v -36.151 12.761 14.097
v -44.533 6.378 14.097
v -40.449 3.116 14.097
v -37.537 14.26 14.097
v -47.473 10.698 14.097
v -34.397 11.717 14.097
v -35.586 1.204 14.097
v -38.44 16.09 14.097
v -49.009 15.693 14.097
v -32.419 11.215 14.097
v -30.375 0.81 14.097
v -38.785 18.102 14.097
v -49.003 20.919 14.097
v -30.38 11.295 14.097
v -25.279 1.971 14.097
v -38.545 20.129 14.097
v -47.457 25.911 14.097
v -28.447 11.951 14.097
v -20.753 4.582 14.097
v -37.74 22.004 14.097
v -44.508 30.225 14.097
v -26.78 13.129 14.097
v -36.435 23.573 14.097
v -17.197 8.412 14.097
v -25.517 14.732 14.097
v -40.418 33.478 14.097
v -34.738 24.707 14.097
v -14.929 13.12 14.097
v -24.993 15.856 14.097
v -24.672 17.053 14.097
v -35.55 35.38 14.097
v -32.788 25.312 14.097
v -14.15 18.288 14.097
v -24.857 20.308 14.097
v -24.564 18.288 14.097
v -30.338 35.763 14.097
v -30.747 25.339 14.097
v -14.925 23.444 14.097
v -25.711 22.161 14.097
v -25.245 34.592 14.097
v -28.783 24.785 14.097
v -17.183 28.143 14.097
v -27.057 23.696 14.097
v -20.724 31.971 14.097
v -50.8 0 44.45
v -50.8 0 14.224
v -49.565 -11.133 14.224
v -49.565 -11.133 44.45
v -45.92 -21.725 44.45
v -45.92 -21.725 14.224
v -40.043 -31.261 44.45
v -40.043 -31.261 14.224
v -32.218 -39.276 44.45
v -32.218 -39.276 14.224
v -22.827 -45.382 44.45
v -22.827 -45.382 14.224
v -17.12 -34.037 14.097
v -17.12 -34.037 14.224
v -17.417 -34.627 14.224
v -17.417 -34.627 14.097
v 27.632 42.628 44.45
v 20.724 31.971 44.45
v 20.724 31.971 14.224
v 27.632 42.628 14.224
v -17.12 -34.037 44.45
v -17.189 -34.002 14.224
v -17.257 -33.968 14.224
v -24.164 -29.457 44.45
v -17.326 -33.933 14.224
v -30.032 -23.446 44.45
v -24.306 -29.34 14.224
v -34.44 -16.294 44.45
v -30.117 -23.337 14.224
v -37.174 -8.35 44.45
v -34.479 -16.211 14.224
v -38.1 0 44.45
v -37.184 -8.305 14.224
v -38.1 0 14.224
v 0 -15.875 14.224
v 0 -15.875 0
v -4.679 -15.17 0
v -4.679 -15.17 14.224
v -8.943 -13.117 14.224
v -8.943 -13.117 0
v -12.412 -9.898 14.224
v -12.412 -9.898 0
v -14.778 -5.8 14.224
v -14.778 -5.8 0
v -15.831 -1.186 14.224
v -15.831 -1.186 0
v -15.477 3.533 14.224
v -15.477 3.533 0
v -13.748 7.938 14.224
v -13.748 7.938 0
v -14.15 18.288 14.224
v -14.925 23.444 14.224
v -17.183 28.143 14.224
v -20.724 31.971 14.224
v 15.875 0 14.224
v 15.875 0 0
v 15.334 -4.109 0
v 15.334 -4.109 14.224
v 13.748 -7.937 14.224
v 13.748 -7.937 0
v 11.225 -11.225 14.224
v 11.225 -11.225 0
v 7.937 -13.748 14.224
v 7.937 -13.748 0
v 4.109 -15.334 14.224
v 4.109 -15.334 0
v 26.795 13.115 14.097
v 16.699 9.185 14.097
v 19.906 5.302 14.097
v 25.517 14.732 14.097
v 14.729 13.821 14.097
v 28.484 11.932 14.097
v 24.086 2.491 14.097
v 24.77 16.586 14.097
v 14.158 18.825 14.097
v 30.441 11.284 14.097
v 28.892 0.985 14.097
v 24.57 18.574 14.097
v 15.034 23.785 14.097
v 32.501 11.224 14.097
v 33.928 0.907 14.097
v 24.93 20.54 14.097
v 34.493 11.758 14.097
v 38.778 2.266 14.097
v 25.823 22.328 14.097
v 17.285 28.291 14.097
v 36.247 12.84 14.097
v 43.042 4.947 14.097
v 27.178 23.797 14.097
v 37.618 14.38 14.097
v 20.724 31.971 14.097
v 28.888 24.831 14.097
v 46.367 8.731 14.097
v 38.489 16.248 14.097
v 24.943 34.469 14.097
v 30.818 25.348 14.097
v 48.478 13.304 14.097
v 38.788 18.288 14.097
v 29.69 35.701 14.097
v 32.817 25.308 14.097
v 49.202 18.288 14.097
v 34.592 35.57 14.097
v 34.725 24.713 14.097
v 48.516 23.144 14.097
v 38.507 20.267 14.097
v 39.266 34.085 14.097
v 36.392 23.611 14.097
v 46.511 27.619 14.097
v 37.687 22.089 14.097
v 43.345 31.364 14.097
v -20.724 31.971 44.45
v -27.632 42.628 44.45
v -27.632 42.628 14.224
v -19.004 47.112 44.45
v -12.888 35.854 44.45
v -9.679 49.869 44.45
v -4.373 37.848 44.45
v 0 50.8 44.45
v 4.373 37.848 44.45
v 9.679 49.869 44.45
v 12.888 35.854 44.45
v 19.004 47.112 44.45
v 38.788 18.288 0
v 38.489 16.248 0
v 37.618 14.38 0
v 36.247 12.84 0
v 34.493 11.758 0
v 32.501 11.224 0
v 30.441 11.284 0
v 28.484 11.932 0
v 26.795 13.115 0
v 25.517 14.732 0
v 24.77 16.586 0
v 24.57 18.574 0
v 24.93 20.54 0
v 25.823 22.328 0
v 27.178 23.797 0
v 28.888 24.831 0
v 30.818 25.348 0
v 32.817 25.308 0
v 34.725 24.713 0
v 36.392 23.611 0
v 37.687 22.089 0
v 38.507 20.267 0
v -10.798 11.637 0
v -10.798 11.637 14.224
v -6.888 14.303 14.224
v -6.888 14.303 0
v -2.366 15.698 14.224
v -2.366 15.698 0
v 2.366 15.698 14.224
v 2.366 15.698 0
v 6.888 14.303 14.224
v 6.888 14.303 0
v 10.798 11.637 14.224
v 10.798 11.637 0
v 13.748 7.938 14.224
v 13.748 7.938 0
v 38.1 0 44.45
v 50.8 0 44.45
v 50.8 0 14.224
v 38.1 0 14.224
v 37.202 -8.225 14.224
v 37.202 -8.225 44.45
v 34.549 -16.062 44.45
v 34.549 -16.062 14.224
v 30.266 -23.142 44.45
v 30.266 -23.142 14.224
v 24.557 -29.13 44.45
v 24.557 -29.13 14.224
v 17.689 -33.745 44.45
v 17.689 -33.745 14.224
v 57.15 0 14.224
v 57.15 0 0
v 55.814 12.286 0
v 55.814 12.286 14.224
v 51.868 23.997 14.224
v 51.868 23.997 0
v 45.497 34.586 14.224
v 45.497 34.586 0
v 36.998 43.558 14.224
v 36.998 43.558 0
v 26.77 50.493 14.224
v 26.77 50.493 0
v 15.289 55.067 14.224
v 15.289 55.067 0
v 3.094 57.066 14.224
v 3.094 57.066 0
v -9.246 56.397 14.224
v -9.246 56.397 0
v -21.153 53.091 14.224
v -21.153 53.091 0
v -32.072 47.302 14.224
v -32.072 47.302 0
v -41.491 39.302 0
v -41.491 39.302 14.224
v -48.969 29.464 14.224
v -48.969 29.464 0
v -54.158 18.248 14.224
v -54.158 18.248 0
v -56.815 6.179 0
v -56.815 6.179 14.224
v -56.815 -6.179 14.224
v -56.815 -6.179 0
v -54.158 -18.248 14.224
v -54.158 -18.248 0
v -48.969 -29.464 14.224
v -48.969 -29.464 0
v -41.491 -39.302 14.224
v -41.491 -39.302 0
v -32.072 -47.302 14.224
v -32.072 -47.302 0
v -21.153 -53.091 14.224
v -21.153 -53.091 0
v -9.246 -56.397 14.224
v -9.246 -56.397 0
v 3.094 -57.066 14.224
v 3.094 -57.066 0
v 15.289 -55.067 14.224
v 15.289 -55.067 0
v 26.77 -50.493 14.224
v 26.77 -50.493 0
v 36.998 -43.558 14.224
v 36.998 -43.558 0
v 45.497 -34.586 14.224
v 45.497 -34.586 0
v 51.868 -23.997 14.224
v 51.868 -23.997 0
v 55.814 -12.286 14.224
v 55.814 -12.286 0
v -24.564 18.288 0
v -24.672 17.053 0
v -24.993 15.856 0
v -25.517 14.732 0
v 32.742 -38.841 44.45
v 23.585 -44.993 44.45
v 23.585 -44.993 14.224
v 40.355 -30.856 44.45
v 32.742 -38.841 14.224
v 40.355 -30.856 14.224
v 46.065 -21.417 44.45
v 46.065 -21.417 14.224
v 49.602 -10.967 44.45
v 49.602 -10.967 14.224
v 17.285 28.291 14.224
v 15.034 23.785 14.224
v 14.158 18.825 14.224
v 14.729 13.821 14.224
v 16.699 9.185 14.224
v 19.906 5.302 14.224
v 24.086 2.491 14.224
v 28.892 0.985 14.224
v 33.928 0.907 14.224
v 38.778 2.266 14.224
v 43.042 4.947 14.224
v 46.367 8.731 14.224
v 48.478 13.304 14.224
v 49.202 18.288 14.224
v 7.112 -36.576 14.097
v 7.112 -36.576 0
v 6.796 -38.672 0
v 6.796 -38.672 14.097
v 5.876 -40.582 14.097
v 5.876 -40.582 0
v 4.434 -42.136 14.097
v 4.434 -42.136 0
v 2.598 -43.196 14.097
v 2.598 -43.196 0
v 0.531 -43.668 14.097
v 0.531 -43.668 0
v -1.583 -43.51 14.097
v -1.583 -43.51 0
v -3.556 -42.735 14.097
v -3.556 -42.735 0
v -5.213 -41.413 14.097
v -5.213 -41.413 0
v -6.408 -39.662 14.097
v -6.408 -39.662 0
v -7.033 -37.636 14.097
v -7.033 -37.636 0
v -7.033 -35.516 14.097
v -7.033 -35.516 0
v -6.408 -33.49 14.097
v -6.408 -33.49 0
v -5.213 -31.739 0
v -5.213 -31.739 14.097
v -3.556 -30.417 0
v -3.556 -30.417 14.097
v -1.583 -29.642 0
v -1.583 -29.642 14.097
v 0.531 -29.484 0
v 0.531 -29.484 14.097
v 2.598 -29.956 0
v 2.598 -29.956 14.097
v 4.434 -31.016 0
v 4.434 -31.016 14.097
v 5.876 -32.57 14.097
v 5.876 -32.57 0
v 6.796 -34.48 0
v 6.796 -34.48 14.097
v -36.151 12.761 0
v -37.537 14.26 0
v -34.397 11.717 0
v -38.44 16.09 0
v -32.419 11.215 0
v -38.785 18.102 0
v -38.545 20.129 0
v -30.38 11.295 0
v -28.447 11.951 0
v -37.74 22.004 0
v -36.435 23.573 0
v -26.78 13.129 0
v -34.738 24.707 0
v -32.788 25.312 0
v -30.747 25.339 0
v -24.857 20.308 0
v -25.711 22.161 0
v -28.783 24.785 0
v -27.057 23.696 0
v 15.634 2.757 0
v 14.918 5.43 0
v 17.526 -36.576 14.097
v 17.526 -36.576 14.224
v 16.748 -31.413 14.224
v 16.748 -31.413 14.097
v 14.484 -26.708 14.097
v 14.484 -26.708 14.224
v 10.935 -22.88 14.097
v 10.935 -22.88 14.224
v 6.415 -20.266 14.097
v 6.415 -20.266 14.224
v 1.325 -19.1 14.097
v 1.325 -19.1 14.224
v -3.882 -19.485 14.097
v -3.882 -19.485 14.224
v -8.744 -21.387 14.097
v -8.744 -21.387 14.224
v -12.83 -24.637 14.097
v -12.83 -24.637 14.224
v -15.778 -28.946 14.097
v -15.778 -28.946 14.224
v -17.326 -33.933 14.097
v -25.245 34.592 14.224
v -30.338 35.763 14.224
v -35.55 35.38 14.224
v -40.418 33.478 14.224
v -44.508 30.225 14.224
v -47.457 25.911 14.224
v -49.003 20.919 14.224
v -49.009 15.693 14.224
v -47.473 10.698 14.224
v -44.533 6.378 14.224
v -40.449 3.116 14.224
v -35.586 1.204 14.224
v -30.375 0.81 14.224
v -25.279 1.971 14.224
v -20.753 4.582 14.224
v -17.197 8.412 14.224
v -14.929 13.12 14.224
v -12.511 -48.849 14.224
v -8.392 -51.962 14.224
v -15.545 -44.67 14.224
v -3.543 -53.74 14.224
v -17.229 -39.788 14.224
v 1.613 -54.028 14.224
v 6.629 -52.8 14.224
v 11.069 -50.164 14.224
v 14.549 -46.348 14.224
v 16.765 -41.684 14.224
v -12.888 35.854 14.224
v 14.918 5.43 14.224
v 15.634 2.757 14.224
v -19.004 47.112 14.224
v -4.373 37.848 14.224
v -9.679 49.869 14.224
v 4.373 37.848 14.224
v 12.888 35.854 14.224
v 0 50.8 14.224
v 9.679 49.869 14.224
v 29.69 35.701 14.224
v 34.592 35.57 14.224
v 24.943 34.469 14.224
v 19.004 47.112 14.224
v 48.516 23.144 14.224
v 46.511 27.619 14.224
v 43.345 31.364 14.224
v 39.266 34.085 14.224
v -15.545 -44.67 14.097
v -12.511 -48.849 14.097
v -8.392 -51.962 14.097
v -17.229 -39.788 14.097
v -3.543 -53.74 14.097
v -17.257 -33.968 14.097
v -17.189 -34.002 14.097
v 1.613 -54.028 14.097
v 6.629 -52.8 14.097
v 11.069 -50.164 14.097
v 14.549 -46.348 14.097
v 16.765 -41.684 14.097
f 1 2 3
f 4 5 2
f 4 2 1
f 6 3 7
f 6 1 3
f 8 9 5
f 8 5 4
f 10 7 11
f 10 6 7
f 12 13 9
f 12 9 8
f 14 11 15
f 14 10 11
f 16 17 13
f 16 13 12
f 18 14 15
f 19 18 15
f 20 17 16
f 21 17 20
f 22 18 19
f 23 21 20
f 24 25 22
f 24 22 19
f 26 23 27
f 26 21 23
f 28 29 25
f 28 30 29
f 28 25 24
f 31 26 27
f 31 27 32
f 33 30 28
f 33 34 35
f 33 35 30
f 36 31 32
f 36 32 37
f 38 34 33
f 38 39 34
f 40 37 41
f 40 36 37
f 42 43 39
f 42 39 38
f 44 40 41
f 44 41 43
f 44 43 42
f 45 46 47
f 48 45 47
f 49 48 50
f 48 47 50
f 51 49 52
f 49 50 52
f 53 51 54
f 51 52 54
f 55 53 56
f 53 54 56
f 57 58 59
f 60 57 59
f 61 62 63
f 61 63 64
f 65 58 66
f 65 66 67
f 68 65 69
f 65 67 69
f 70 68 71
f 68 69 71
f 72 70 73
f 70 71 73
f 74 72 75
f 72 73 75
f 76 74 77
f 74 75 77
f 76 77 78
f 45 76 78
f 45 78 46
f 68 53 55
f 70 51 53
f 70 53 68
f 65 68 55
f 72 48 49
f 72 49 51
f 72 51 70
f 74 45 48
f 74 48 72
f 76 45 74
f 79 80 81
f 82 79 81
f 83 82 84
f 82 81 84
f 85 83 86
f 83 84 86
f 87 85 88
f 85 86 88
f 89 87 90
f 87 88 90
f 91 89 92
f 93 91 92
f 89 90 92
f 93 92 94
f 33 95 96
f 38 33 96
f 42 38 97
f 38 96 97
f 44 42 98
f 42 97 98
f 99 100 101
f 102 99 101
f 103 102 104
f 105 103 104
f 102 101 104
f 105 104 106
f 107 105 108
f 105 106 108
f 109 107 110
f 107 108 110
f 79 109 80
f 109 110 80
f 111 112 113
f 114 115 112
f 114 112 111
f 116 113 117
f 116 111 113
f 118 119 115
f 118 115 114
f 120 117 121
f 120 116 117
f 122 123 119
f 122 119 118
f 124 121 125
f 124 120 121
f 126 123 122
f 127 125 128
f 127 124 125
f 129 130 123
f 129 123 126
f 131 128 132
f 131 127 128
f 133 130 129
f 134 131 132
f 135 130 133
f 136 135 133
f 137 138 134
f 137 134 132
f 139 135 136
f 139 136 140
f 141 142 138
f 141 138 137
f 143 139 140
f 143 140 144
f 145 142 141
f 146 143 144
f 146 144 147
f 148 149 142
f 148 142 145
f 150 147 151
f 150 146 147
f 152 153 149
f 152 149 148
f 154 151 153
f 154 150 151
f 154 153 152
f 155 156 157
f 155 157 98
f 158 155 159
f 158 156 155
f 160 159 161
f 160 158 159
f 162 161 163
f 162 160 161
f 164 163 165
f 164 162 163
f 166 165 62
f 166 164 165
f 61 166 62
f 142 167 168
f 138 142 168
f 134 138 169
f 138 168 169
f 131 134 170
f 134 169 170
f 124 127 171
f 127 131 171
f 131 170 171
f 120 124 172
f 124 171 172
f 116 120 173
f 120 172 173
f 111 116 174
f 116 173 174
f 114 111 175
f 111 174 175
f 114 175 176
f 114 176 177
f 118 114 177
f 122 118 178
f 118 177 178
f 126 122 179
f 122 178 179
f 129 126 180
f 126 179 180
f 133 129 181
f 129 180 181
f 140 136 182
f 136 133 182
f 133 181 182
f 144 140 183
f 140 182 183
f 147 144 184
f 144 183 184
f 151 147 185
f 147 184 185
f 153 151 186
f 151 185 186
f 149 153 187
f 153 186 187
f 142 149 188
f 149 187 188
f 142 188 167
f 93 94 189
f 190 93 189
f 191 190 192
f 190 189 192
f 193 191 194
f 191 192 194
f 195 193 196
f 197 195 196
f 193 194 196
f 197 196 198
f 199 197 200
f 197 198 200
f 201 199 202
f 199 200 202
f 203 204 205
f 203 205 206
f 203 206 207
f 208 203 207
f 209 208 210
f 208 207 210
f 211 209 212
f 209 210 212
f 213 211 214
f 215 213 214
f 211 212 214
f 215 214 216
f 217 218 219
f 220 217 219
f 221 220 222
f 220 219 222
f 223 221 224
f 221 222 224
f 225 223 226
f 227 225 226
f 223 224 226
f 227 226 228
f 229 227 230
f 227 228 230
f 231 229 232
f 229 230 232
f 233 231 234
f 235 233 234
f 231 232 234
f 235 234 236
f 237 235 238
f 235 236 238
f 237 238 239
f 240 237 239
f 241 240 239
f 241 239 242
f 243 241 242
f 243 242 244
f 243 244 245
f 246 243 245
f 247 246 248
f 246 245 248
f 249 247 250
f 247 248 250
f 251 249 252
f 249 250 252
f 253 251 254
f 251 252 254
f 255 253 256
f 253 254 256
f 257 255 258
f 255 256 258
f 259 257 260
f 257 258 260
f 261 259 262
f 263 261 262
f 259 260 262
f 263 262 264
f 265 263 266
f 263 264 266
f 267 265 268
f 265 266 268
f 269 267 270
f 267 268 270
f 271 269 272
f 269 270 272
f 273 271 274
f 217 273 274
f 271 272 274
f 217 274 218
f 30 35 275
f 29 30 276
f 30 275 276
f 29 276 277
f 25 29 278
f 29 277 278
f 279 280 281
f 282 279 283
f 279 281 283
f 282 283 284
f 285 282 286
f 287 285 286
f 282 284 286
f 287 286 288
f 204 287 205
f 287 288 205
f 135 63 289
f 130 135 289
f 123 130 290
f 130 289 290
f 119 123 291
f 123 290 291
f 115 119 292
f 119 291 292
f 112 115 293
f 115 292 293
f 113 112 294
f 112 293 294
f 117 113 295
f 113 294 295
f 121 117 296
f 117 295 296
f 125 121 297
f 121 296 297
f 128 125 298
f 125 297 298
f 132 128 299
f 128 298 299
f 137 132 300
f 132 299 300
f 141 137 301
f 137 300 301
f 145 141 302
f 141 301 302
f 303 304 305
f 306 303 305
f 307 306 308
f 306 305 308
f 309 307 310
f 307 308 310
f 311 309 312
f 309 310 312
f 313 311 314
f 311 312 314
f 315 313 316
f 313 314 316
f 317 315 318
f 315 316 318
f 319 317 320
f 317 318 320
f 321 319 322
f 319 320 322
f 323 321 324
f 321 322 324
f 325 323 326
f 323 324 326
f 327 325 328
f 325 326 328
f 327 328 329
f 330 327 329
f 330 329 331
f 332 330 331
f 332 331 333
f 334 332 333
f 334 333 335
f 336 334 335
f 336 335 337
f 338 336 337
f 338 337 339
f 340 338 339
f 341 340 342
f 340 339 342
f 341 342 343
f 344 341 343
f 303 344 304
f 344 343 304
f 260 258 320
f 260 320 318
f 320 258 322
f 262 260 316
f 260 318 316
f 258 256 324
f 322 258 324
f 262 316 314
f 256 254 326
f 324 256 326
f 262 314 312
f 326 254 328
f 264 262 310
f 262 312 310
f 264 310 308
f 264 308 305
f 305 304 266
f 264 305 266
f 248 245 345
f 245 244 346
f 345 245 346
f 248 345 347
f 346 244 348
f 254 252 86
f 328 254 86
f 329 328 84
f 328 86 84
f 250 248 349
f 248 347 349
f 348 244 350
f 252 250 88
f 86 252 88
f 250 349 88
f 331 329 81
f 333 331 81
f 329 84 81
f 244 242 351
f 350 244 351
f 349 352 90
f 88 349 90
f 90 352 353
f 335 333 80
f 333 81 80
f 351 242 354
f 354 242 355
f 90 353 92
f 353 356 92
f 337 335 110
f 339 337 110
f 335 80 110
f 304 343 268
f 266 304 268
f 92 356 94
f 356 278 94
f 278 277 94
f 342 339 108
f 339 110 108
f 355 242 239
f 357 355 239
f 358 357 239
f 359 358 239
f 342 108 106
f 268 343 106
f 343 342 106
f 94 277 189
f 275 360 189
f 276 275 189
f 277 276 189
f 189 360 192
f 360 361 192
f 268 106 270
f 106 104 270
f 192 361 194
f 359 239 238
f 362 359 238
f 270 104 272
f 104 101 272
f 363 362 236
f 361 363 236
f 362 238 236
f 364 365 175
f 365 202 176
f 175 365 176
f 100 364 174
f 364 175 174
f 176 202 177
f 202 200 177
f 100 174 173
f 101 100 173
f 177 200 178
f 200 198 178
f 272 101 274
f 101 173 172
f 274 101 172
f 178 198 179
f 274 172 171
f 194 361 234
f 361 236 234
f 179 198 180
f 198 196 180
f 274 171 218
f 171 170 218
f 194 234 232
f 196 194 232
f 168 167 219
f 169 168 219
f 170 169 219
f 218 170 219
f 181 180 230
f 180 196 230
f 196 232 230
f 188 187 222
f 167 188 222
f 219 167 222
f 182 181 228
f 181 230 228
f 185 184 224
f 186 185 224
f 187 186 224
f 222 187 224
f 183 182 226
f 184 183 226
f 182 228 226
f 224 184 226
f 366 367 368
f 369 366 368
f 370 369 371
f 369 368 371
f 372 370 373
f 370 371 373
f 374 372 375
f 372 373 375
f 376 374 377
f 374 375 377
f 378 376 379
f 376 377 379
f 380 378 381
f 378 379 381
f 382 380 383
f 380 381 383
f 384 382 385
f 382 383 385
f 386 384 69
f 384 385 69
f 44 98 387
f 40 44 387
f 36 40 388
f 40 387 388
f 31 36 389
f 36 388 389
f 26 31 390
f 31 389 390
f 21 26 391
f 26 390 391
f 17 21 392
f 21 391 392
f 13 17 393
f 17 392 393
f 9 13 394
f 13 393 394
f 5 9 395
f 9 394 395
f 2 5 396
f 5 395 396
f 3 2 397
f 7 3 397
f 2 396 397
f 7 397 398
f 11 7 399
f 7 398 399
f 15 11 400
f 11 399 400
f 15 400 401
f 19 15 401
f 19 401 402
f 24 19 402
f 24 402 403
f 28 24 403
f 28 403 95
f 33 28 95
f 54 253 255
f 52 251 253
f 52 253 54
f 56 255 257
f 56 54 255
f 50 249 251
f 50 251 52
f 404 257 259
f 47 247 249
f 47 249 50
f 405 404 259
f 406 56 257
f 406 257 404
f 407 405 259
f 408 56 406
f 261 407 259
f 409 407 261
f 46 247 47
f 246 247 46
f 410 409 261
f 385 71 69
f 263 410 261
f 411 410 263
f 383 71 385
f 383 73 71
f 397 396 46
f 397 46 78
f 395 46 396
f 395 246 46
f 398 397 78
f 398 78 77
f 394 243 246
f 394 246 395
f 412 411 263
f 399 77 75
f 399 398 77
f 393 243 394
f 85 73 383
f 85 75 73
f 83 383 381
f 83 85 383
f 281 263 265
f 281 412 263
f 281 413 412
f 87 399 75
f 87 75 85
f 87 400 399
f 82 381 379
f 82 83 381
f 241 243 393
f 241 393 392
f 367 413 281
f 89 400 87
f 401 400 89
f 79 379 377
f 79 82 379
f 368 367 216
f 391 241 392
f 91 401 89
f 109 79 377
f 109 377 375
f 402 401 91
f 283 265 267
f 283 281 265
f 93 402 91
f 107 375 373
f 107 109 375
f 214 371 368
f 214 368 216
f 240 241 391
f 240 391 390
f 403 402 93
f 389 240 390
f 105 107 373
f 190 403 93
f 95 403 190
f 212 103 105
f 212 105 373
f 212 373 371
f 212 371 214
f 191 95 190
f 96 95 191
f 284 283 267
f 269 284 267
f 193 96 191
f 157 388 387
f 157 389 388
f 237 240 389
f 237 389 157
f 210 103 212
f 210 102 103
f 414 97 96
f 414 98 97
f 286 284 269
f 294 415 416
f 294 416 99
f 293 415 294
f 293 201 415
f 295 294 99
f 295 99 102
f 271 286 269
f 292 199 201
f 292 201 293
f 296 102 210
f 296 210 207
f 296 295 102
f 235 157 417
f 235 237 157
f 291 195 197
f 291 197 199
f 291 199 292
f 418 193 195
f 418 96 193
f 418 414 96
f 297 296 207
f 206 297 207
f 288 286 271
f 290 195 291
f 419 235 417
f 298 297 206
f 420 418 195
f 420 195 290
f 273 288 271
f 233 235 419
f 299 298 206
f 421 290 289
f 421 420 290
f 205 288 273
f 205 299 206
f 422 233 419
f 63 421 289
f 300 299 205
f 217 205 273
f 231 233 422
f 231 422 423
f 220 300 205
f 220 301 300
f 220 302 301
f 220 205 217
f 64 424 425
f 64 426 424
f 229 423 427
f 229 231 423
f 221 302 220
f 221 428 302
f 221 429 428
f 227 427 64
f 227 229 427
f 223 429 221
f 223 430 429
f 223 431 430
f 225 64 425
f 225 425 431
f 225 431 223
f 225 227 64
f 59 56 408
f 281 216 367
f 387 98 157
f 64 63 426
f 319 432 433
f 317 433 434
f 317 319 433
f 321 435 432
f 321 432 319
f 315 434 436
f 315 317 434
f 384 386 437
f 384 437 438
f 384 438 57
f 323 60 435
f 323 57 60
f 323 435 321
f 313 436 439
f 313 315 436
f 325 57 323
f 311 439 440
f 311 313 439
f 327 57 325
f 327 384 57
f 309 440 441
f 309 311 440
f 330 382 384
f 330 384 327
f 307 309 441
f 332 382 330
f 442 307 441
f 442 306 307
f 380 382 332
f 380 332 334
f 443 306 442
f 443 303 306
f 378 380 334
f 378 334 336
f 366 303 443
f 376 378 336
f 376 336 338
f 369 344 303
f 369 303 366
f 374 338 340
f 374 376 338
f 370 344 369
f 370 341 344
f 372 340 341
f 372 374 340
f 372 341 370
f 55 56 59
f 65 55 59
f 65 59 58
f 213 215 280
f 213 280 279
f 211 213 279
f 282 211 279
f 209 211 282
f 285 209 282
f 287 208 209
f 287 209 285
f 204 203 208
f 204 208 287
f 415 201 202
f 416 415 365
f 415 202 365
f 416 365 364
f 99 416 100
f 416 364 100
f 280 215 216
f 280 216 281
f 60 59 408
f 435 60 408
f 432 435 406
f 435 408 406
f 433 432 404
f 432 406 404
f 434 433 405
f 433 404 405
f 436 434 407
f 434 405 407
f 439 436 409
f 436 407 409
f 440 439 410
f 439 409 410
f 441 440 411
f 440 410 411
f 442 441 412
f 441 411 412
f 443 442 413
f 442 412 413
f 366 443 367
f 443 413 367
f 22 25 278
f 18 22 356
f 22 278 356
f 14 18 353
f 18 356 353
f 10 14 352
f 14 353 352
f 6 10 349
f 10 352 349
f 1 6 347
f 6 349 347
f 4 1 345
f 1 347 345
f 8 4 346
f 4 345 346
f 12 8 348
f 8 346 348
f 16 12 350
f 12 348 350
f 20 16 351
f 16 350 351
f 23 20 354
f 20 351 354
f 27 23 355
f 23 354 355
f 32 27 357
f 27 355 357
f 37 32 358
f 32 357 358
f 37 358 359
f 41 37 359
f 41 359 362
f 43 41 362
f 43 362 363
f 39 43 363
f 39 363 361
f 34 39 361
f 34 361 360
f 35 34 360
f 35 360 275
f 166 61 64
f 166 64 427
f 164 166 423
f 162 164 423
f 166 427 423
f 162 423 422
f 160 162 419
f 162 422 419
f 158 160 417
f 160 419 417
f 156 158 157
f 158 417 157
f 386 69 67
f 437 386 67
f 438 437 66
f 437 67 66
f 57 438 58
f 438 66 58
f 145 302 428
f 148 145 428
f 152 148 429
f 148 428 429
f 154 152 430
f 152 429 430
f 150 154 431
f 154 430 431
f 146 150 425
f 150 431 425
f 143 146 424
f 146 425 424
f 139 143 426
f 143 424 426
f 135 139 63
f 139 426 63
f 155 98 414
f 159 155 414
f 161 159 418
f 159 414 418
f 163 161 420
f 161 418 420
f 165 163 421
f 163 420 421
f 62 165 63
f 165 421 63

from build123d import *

# Parameters (mm, degrees)
F0_R     = 57.15
F1_DEPTH = 14.224
F3_DEPTH = 30.226
F4_R     = 7.112
F5_DEPTH = 0.127


with BuildPart() as f1:
    # F0 (on Top) → F1 (new body)
    with BuildSketch(Plane.XY):
        Circle(F0_R)
        with BuildLine():
            ThreePointArc((0, -29.464), (5.0289434278, -31.5470565722), (7.112, -36.576))
            ThreePointArc((7.112, -36.576), (-5.0289434278, -41.6049434278), (0, -29.464))
        make_face(mode=Mode.SUBTRACT)
        with BuildLine():
            ThreePointArc((-24.5637451688, 18.288), (-24.8060806923, 16.4472789512), (-25.5165724971, 14.732))
            ThreePointArc((-25.5165724971, 14.732), (-38.5454096454, 20.1287210488), (-24.5637451688, 18.288))
        make_face(mode=Mode.SUBTRACT)
        with BuildLine():
            ThreePointArc((15.875, 0), (11.2253201513, -11.2253201513), (0, -15.875))
            ThreePointArc((0, -15.875), (-13.7481532851, -7.9375), (-13.7481532851, 7.9375))
            ThreePointArc((-13.7481532851, 7.9375), (0, 15.875), (13.7481532851, 7.9375))
            ThreePointArc((13.7481532851, 7.9375), (15.3340724923, 4.108752341), (15.875, 0))
        make_face(mode=Mode.SUBTRACT)
        with BuildLine():
            ThreePointArc((38.7877451688, 18.288), (33.5164662176, 11.4183355234), (25.5165724971, 14.732))
            ThreePointArc((25.5165724971, 14.732), (29.8350241201, 25.1576644766), (38.7877451688, 18.288))
        make_face(mode=Mode.SUBTRACT)
    extrude(amount=F1_DEPTH)

    # F2 (on face) → F3 (join)
    with BuildSketch(Plane.XY.offset(14.224)):
        with BuildLine():
            ThreePointArc((-17.1202854359, -34.0368304428), (-32.4337237695, -19.9915872918), (-38.1, 0))
            Line((-38.1, 0), (-50.8, 0))
            ThreePointArc((-50.8, 0), (-43.244965026, -26.6554497224), (-22.8270472479, -45.3824405904))
            Line((-22.8270472479, -45.3824405904), (-17.1202854359, -34.0368304428))
        make_face()
        with BuildLine():
            ThreePointArc((-20.7239090963, 31.9707615137), (0, 38.1), (20.7239090963, 31.9707615137))
            Line((20.7239090963, 31.9707615137), (27.6318787951, 42.6276820183))
            ThreePointArc((27.6318787951, 42.6276820183), (0, 50.8), (-27.6318787951, 42.6276820183))
            Line((-27.6318787951, 42.6276820183), (-20.7239090963, 31.9707615137))
        make_face()
        with BuildLine():
            ThreePointArc((38.1, 0), (32.6002459501, -19.7188732942), (17.6887682944, -33.7448881496))
            Line((17.6887682944, -33.7448881496), (23.5850243925, -44.9931841994))
            ThreePointArc((23.5850243925, -44.9931841994), (43.4669946002, -26.2918310589), (50.8, 0))
            Line((50.8, 0), (38.1, 0))
        make_face()
    extrude(amount=F3_DEPTH)

    # F4 (on face) → F5 (cut)
    with BuildSketch(Plane.XY.offset(14.224)):
        with BuildLine():
            ThreePointArc((-20.7239090963, 31.9707615137), (-47.4729372454, 10.6979144605), (-14.1497451688, 18.288))
            ThreePointArc((-14.1497451688, 18.288), (-15.8785530923, 25.8780855395), (-20.7239090963, 31.9707615137))
        make_face()
        with Locations((-31.6757451688, 18.288)):
            Circle(F4_R, mode=Mode.SUBTRACT)
        with BuildLine():
            ThreePointArc((49.2017451688, 18.288), (39.2658307083, 34.0851920765), (20.7239090963, 31.9707615137))
            ThreePointArc((20.7239090963, 31.9707615137), (24.0856596293, 2.4908079235), (49.2017451688, 18.288))
        make_face()
        with Locations((31.6757451688, 18.288)):
            Circle(F4_R, mode=Mode.SUBTRACT)
        with BuildLine():
            ThreePointArc((-17.4173370009, -34.6273985025), (-0.9758144603, -54.0748131637), (17.526, -36.576))
            ThreePointArc((17.526, -36.576), (1.3253891442, -19.1001875835), (-17.325537101, -33.9328125))
            ThreePointArc((-17.325537101, -33.9328125), (-17.2229897955, -33.9849764235), (-17.1202854359, -34.0368304428))
            Line((-17.1202854359, -34.0368304428), (-17.4173370009, -34.6273985025))
        make_face()
        with Locations((0, -36.576)):
            Circle(F4_R, mode=Mode.SUBTRACT)
    extrude(amount=-F5_DEPTH, mode=Mode.SUBTRACT)


solid = f1.part
